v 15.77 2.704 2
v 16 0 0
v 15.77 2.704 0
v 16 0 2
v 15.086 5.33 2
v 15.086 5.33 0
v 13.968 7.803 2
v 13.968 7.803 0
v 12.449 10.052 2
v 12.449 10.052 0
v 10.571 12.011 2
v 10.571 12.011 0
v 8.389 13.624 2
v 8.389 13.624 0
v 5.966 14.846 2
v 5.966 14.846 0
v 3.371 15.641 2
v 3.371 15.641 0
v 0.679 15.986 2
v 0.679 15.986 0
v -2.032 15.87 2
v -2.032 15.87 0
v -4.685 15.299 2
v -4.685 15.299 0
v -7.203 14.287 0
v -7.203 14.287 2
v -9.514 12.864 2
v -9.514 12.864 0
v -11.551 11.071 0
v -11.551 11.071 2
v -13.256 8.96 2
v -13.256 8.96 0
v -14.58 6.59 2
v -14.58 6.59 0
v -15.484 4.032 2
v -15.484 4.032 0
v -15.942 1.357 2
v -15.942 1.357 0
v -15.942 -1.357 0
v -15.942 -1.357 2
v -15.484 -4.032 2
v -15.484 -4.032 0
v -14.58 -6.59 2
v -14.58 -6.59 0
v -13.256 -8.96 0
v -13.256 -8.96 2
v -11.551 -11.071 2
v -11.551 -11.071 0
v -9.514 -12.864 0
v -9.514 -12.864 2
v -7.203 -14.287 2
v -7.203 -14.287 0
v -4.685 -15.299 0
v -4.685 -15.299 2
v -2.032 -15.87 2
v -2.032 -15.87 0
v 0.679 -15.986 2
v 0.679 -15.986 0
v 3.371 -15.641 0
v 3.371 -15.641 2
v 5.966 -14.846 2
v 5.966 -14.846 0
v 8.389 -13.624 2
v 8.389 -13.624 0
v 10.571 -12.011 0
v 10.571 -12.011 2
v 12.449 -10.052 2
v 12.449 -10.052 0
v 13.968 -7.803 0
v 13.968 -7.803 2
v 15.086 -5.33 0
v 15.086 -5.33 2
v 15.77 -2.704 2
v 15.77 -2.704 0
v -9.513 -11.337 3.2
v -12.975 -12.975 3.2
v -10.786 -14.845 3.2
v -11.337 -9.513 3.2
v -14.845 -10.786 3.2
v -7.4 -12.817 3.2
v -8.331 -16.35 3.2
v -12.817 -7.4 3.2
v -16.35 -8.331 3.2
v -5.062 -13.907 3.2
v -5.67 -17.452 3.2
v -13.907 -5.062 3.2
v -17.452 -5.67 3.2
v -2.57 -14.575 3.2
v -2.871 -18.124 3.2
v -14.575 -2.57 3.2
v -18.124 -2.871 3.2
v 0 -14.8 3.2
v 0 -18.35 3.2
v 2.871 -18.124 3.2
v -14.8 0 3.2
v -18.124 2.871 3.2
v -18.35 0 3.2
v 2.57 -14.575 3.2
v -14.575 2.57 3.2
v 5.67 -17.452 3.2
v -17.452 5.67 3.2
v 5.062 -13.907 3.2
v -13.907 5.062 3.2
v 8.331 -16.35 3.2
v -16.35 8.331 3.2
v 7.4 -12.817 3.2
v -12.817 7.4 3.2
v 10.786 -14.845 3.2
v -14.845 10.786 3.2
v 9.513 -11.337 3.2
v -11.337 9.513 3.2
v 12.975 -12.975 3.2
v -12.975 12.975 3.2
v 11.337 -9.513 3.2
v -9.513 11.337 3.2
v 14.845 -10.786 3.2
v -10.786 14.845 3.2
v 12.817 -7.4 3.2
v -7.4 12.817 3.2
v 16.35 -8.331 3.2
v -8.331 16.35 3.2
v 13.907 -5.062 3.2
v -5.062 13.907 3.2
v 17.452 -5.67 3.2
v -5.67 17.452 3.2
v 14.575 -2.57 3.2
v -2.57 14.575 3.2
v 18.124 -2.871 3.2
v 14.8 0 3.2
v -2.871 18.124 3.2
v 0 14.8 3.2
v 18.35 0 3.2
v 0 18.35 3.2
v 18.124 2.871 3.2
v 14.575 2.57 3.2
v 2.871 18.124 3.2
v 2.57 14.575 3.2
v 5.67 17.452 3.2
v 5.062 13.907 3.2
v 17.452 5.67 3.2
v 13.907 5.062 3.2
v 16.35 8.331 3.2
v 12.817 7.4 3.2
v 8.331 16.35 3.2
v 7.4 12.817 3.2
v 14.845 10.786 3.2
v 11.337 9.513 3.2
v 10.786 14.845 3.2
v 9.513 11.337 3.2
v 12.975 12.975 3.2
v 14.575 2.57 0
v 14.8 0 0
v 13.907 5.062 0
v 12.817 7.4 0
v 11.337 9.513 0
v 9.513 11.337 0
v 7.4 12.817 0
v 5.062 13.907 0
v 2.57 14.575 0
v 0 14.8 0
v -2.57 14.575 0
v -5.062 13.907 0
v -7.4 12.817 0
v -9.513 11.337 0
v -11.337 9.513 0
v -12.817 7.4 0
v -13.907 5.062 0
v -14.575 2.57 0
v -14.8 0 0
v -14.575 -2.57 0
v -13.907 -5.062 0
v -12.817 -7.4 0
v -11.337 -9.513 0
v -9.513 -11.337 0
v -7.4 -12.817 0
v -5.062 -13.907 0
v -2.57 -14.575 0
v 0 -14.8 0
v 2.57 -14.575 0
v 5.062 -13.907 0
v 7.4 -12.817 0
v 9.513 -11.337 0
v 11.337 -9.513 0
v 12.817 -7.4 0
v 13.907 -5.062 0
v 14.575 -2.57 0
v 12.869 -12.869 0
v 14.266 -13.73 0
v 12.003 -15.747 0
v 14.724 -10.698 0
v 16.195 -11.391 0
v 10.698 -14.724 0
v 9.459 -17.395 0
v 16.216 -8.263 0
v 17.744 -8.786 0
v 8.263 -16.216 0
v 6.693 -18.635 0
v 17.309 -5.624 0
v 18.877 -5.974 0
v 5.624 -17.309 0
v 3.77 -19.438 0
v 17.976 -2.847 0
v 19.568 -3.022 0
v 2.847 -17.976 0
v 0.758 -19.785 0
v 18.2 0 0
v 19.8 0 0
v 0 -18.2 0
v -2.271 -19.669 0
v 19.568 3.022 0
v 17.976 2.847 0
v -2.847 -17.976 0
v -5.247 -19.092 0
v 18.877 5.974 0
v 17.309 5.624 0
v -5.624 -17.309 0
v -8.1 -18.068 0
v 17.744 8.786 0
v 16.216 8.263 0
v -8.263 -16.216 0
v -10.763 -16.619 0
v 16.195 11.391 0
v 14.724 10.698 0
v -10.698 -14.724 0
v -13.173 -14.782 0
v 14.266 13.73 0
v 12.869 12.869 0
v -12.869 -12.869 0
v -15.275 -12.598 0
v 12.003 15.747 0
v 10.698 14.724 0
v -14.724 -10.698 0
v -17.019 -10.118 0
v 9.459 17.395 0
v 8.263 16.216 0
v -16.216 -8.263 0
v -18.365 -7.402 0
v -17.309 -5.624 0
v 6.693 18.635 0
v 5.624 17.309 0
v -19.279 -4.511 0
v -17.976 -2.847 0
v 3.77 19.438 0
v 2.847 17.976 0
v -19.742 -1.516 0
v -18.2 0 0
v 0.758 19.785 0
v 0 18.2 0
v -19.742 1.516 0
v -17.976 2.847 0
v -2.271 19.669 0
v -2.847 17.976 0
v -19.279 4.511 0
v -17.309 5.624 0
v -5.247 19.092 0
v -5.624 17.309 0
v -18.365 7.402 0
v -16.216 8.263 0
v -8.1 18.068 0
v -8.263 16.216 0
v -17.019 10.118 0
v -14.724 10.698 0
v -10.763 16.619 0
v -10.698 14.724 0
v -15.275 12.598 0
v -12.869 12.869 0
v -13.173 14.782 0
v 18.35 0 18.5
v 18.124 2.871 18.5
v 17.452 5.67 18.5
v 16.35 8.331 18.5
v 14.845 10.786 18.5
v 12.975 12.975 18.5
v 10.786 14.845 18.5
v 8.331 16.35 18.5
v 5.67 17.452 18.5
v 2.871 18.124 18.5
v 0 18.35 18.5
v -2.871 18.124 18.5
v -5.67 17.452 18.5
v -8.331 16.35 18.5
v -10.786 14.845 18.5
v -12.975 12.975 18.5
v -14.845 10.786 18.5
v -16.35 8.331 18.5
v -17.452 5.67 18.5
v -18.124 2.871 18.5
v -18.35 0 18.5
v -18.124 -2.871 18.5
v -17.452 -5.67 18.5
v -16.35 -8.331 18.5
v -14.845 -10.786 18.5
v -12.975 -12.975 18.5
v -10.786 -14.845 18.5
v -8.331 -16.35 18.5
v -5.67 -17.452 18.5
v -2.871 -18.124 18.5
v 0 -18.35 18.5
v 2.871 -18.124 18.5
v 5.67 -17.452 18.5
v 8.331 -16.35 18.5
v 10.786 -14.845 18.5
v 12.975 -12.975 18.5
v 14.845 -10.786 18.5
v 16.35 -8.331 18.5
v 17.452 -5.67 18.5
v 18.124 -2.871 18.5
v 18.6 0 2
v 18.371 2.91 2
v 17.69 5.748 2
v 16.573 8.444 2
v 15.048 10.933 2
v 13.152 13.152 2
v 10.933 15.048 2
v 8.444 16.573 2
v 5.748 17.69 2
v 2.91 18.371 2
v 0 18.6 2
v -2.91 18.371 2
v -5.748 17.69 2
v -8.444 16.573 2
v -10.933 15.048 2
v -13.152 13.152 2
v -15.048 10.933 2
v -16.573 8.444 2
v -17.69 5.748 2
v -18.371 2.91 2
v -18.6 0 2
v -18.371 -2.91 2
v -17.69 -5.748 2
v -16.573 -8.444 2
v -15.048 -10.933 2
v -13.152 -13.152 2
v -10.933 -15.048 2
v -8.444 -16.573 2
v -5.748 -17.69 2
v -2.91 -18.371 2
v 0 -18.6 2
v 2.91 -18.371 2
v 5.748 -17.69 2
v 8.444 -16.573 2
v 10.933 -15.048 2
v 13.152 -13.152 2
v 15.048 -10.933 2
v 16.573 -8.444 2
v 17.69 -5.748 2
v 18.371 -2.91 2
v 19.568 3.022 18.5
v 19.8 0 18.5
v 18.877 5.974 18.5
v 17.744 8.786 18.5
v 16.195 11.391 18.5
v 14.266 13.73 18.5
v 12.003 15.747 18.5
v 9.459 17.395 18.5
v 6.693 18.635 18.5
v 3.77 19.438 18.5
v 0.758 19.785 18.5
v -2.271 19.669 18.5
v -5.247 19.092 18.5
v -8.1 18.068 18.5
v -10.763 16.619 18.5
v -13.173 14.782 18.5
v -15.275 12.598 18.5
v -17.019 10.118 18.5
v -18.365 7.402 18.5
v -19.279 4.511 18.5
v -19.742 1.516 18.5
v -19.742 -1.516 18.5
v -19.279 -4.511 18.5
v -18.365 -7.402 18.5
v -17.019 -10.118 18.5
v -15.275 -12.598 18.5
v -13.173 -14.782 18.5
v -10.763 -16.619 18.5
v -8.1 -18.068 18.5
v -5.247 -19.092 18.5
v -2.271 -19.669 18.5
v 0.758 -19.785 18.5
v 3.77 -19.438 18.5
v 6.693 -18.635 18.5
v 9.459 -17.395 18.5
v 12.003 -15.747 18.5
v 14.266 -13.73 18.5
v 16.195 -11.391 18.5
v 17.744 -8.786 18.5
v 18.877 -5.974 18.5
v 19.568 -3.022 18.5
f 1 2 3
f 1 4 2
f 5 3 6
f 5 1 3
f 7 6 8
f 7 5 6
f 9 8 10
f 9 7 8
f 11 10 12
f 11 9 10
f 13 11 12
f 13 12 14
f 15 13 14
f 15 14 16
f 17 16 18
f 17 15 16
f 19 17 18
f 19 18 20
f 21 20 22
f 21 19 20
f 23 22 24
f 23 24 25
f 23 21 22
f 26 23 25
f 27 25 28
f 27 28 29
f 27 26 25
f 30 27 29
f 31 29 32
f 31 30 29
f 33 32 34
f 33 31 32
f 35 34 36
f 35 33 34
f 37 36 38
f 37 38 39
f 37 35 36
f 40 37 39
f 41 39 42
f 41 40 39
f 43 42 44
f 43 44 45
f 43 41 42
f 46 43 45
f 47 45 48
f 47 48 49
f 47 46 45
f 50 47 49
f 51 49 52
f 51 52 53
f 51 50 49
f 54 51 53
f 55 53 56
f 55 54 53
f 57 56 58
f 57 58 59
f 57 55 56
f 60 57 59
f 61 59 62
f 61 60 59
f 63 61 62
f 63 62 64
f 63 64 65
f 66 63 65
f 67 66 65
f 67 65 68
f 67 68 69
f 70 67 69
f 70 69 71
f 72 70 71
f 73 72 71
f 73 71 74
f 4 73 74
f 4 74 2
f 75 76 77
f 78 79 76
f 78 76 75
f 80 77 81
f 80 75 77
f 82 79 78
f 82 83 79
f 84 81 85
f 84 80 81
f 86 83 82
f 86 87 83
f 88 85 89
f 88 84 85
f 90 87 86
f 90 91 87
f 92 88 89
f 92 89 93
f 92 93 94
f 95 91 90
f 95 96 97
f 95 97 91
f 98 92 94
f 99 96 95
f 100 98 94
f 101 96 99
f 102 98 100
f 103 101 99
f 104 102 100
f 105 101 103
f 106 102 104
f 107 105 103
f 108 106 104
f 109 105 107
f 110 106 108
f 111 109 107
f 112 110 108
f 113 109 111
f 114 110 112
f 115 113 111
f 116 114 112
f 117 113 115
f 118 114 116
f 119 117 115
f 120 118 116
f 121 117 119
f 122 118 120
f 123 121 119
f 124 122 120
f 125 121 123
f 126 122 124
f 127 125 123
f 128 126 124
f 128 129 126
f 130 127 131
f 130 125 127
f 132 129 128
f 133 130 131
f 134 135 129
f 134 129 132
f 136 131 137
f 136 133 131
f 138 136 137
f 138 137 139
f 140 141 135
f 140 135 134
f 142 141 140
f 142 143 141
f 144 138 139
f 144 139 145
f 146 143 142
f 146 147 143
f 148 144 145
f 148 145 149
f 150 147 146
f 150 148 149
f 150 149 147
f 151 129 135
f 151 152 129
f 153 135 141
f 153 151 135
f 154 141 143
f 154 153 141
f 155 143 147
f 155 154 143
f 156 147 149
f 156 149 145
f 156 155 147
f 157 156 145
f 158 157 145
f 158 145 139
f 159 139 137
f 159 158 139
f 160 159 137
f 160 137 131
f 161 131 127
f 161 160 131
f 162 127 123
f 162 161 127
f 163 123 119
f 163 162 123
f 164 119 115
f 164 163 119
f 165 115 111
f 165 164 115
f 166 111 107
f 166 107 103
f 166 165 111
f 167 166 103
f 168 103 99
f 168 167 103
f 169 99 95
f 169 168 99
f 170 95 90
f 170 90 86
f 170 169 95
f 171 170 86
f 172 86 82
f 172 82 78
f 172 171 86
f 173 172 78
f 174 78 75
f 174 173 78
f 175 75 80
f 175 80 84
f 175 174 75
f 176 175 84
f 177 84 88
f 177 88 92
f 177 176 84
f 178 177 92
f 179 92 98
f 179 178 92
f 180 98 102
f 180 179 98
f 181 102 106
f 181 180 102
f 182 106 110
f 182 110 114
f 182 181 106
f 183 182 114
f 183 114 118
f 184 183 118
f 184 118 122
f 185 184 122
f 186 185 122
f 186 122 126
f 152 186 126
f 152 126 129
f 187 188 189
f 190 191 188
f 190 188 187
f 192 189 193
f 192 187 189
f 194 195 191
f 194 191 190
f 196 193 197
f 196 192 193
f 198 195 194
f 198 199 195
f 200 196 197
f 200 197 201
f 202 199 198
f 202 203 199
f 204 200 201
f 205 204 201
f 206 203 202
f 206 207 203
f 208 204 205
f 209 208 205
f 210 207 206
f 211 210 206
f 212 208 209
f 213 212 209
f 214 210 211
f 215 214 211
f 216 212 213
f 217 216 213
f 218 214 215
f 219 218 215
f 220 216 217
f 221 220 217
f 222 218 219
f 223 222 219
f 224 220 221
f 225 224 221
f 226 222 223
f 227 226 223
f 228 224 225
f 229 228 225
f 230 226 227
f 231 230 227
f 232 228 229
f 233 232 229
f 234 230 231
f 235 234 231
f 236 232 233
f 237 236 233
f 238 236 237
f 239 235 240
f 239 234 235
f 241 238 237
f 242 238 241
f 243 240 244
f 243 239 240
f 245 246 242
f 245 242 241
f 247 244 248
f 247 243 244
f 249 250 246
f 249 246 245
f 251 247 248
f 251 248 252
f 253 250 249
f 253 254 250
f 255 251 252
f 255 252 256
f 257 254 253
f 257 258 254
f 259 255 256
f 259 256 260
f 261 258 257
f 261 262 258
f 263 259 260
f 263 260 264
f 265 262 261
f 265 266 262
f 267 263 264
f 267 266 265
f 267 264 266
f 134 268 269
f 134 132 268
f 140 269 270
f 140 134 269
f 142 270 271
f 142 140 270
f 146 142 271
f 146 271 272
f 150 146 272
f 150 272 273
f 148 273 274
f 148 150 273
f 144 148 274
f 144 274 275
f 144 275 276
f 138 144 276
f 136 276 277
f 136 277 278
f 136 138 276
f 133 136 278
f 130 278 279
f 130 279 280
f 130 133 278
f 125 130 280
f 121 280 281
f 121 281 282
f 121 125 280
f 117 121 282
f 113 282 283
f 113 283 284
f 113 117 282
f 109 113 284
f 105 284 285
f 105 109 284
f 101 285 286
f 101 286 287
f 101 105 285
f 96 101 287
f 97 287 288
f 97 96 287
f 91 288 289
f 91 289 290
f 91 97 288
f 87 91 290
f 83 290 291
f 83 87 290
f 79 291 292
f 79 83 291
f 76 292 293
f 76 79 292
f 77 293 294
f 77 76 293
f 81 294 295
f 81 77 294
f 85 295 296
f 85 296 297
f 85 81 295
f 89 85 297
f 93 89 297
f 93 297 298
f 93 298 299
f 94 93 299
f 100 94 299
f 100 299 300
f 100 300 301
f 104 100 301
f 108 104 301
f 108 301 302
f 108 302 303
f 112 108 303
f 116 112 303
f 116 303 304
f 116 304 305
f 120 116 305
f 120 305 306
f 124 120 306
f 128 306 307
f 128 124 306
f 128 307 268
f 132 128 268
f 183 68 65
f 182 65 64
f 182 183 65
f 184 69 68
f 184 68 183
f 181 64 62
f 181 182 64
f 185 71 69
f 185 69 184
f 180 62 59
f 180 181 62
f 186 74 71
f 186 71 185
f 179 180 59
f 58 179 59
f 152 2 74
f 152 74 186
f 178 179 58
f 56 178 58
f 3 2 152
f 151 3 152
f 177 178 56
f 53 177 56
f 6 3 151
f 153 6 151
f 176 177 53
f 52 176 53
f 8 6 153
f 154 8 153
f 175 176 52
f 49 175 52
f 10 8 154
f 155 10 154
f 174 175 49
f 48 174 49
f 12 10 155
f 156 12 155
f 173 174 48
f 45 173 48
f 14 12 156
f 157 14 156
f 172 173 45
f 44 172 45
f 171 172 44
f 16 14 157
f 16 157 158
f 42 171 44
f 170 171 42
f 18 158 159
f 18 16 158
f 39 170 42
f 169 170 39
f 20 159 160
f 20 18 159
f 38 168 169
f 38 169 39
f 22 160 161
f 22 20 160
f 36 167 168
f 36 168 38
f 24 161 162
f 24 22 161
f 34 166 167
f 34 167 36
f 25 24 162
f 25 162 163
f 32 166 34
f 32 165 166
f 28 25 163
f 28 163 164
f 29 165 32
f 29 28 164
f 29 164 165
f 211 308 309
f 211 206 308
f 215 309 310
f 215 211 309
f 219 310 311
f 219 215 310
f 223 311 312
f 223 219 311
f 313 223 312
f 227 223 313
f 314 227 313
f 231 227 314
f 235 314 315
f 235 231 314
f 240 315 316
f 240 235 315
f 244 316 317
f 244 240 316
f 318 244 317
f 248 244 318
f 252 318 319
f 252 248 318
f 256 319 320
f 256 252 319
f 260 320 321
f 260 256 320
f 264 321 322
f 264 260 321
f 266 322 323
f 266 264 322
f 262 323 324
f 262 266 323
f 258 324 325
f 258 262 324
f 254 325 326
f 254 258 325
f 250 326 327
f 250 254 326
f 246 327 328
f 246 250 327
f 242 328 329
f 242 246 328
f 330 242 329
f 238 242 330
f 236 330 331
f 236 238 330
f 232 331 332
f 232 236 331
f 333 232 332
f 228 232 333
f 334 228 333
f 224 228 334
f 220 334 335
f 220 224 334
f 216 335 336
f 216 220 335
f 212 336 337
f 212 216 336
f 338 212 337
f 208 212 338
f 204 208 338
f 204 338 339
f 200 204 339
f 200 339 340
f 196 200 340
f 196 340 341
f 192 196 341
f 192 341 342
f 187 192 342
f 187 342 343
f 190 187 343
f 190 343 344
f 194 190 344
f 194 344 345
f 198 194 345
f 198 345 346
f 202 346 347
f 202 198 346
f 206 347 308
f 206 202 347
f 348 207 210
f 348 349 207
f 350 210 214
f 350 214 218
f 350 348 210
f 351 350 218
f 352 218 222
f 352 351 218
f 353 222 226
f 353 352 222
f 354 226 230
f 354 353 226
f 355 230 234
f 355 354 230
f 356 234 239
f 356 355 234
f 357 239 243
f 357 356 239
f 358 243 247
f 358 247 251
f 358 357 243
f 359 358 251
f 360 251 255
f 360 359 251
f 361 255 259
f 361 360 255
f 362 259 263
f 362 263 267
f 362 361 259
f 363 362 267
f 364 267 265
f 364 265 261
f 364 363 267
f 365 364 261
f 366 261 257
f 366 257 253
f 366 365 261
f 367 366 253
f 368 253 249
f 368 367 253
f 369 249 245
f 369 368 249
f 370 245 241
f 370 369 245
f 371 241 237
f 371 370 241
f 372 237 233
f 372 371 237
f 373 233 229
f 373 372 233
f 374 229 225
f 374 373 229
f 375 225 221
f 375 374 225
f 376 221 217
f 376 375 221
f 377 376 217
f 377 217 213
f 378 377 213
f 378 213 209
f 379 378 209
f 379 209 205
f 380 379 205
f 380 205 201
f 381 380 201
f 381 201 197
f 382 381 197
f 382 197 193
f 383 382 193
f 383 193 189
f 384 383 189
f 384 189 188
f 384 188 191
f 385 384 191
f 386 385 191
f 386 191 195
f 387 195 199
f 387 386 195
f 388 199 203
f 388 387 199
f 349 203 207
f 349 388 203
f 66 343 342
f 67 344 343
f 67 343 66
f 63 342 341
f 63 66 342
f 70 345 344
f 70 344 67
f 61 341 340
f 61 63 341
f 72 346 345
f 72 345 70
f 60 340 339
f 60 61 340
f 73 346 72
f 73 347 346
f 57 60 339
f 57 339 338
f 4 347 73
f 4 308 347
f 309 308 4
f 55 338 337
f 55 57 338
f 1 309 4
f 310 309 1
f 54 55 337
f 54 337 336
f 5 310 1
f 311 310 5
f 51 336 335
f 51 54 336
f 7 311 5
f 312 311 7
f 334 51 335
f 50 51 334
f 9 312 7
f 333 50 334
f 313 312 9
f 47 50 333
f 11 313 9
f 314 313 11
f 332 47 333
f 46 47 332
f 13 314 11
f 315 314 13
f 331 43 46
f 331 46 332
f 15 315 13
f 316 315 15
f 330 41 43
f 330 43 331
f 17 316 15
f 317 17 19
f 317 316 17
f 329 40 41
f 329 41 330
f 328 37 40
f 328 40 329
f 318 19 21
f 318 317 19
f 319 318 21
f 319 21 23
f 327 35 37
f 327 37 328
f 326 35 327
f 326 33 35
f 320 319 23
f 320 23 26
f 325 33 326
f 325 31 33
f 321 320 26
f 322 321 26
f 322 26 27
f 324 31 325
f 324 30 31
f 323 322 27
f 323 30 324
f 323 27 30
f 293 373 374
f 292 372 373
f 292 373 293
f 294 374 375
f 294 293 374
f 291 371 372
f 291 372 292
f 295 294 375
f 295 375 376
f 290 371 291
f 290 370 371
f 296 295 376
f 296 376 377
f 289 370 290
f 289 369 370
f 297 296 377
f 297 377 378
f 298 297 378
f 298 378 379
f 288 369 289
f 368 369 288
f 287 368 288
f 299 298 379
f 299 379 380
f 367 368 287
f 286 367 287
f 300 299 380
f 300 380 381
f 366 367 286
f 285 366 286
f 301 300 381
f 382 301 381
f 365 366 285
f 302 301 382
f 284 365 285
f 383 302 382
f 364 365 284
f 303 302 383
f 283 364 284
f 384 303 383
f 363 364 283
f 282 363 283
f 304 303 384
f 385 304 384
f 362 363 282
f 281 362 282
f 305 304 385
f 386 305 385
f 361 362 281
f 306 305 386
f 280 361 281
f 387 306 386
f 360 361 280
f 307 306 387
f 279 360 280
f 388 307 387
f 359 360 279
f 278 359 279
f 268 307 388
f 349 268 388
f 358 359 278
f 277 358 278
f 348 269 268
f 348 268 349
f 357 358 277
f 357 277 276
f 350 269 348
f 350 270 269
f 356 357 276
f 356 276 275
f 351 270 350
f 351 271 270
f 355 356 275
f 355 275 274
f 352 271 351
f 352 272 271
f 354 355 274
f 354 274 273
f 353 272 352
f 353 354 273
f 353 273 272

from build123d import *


with BuildPart() as part:
    # Sketch → Revolution (revolve)
    with BuildSketch(Plane.XZ):
        Polygon((16, 0), (16, 2), (18.6, 2), (18.2, 0), (19.8, 0), (19.8, 18.5), (18.35, 18.5), (18.35, 3.2), (14.8, 3.2), (14.8, 0), align=None)
    revolve(axis=Axis((0, 0, 0), (0, 0, 1)))


solid = part.part
